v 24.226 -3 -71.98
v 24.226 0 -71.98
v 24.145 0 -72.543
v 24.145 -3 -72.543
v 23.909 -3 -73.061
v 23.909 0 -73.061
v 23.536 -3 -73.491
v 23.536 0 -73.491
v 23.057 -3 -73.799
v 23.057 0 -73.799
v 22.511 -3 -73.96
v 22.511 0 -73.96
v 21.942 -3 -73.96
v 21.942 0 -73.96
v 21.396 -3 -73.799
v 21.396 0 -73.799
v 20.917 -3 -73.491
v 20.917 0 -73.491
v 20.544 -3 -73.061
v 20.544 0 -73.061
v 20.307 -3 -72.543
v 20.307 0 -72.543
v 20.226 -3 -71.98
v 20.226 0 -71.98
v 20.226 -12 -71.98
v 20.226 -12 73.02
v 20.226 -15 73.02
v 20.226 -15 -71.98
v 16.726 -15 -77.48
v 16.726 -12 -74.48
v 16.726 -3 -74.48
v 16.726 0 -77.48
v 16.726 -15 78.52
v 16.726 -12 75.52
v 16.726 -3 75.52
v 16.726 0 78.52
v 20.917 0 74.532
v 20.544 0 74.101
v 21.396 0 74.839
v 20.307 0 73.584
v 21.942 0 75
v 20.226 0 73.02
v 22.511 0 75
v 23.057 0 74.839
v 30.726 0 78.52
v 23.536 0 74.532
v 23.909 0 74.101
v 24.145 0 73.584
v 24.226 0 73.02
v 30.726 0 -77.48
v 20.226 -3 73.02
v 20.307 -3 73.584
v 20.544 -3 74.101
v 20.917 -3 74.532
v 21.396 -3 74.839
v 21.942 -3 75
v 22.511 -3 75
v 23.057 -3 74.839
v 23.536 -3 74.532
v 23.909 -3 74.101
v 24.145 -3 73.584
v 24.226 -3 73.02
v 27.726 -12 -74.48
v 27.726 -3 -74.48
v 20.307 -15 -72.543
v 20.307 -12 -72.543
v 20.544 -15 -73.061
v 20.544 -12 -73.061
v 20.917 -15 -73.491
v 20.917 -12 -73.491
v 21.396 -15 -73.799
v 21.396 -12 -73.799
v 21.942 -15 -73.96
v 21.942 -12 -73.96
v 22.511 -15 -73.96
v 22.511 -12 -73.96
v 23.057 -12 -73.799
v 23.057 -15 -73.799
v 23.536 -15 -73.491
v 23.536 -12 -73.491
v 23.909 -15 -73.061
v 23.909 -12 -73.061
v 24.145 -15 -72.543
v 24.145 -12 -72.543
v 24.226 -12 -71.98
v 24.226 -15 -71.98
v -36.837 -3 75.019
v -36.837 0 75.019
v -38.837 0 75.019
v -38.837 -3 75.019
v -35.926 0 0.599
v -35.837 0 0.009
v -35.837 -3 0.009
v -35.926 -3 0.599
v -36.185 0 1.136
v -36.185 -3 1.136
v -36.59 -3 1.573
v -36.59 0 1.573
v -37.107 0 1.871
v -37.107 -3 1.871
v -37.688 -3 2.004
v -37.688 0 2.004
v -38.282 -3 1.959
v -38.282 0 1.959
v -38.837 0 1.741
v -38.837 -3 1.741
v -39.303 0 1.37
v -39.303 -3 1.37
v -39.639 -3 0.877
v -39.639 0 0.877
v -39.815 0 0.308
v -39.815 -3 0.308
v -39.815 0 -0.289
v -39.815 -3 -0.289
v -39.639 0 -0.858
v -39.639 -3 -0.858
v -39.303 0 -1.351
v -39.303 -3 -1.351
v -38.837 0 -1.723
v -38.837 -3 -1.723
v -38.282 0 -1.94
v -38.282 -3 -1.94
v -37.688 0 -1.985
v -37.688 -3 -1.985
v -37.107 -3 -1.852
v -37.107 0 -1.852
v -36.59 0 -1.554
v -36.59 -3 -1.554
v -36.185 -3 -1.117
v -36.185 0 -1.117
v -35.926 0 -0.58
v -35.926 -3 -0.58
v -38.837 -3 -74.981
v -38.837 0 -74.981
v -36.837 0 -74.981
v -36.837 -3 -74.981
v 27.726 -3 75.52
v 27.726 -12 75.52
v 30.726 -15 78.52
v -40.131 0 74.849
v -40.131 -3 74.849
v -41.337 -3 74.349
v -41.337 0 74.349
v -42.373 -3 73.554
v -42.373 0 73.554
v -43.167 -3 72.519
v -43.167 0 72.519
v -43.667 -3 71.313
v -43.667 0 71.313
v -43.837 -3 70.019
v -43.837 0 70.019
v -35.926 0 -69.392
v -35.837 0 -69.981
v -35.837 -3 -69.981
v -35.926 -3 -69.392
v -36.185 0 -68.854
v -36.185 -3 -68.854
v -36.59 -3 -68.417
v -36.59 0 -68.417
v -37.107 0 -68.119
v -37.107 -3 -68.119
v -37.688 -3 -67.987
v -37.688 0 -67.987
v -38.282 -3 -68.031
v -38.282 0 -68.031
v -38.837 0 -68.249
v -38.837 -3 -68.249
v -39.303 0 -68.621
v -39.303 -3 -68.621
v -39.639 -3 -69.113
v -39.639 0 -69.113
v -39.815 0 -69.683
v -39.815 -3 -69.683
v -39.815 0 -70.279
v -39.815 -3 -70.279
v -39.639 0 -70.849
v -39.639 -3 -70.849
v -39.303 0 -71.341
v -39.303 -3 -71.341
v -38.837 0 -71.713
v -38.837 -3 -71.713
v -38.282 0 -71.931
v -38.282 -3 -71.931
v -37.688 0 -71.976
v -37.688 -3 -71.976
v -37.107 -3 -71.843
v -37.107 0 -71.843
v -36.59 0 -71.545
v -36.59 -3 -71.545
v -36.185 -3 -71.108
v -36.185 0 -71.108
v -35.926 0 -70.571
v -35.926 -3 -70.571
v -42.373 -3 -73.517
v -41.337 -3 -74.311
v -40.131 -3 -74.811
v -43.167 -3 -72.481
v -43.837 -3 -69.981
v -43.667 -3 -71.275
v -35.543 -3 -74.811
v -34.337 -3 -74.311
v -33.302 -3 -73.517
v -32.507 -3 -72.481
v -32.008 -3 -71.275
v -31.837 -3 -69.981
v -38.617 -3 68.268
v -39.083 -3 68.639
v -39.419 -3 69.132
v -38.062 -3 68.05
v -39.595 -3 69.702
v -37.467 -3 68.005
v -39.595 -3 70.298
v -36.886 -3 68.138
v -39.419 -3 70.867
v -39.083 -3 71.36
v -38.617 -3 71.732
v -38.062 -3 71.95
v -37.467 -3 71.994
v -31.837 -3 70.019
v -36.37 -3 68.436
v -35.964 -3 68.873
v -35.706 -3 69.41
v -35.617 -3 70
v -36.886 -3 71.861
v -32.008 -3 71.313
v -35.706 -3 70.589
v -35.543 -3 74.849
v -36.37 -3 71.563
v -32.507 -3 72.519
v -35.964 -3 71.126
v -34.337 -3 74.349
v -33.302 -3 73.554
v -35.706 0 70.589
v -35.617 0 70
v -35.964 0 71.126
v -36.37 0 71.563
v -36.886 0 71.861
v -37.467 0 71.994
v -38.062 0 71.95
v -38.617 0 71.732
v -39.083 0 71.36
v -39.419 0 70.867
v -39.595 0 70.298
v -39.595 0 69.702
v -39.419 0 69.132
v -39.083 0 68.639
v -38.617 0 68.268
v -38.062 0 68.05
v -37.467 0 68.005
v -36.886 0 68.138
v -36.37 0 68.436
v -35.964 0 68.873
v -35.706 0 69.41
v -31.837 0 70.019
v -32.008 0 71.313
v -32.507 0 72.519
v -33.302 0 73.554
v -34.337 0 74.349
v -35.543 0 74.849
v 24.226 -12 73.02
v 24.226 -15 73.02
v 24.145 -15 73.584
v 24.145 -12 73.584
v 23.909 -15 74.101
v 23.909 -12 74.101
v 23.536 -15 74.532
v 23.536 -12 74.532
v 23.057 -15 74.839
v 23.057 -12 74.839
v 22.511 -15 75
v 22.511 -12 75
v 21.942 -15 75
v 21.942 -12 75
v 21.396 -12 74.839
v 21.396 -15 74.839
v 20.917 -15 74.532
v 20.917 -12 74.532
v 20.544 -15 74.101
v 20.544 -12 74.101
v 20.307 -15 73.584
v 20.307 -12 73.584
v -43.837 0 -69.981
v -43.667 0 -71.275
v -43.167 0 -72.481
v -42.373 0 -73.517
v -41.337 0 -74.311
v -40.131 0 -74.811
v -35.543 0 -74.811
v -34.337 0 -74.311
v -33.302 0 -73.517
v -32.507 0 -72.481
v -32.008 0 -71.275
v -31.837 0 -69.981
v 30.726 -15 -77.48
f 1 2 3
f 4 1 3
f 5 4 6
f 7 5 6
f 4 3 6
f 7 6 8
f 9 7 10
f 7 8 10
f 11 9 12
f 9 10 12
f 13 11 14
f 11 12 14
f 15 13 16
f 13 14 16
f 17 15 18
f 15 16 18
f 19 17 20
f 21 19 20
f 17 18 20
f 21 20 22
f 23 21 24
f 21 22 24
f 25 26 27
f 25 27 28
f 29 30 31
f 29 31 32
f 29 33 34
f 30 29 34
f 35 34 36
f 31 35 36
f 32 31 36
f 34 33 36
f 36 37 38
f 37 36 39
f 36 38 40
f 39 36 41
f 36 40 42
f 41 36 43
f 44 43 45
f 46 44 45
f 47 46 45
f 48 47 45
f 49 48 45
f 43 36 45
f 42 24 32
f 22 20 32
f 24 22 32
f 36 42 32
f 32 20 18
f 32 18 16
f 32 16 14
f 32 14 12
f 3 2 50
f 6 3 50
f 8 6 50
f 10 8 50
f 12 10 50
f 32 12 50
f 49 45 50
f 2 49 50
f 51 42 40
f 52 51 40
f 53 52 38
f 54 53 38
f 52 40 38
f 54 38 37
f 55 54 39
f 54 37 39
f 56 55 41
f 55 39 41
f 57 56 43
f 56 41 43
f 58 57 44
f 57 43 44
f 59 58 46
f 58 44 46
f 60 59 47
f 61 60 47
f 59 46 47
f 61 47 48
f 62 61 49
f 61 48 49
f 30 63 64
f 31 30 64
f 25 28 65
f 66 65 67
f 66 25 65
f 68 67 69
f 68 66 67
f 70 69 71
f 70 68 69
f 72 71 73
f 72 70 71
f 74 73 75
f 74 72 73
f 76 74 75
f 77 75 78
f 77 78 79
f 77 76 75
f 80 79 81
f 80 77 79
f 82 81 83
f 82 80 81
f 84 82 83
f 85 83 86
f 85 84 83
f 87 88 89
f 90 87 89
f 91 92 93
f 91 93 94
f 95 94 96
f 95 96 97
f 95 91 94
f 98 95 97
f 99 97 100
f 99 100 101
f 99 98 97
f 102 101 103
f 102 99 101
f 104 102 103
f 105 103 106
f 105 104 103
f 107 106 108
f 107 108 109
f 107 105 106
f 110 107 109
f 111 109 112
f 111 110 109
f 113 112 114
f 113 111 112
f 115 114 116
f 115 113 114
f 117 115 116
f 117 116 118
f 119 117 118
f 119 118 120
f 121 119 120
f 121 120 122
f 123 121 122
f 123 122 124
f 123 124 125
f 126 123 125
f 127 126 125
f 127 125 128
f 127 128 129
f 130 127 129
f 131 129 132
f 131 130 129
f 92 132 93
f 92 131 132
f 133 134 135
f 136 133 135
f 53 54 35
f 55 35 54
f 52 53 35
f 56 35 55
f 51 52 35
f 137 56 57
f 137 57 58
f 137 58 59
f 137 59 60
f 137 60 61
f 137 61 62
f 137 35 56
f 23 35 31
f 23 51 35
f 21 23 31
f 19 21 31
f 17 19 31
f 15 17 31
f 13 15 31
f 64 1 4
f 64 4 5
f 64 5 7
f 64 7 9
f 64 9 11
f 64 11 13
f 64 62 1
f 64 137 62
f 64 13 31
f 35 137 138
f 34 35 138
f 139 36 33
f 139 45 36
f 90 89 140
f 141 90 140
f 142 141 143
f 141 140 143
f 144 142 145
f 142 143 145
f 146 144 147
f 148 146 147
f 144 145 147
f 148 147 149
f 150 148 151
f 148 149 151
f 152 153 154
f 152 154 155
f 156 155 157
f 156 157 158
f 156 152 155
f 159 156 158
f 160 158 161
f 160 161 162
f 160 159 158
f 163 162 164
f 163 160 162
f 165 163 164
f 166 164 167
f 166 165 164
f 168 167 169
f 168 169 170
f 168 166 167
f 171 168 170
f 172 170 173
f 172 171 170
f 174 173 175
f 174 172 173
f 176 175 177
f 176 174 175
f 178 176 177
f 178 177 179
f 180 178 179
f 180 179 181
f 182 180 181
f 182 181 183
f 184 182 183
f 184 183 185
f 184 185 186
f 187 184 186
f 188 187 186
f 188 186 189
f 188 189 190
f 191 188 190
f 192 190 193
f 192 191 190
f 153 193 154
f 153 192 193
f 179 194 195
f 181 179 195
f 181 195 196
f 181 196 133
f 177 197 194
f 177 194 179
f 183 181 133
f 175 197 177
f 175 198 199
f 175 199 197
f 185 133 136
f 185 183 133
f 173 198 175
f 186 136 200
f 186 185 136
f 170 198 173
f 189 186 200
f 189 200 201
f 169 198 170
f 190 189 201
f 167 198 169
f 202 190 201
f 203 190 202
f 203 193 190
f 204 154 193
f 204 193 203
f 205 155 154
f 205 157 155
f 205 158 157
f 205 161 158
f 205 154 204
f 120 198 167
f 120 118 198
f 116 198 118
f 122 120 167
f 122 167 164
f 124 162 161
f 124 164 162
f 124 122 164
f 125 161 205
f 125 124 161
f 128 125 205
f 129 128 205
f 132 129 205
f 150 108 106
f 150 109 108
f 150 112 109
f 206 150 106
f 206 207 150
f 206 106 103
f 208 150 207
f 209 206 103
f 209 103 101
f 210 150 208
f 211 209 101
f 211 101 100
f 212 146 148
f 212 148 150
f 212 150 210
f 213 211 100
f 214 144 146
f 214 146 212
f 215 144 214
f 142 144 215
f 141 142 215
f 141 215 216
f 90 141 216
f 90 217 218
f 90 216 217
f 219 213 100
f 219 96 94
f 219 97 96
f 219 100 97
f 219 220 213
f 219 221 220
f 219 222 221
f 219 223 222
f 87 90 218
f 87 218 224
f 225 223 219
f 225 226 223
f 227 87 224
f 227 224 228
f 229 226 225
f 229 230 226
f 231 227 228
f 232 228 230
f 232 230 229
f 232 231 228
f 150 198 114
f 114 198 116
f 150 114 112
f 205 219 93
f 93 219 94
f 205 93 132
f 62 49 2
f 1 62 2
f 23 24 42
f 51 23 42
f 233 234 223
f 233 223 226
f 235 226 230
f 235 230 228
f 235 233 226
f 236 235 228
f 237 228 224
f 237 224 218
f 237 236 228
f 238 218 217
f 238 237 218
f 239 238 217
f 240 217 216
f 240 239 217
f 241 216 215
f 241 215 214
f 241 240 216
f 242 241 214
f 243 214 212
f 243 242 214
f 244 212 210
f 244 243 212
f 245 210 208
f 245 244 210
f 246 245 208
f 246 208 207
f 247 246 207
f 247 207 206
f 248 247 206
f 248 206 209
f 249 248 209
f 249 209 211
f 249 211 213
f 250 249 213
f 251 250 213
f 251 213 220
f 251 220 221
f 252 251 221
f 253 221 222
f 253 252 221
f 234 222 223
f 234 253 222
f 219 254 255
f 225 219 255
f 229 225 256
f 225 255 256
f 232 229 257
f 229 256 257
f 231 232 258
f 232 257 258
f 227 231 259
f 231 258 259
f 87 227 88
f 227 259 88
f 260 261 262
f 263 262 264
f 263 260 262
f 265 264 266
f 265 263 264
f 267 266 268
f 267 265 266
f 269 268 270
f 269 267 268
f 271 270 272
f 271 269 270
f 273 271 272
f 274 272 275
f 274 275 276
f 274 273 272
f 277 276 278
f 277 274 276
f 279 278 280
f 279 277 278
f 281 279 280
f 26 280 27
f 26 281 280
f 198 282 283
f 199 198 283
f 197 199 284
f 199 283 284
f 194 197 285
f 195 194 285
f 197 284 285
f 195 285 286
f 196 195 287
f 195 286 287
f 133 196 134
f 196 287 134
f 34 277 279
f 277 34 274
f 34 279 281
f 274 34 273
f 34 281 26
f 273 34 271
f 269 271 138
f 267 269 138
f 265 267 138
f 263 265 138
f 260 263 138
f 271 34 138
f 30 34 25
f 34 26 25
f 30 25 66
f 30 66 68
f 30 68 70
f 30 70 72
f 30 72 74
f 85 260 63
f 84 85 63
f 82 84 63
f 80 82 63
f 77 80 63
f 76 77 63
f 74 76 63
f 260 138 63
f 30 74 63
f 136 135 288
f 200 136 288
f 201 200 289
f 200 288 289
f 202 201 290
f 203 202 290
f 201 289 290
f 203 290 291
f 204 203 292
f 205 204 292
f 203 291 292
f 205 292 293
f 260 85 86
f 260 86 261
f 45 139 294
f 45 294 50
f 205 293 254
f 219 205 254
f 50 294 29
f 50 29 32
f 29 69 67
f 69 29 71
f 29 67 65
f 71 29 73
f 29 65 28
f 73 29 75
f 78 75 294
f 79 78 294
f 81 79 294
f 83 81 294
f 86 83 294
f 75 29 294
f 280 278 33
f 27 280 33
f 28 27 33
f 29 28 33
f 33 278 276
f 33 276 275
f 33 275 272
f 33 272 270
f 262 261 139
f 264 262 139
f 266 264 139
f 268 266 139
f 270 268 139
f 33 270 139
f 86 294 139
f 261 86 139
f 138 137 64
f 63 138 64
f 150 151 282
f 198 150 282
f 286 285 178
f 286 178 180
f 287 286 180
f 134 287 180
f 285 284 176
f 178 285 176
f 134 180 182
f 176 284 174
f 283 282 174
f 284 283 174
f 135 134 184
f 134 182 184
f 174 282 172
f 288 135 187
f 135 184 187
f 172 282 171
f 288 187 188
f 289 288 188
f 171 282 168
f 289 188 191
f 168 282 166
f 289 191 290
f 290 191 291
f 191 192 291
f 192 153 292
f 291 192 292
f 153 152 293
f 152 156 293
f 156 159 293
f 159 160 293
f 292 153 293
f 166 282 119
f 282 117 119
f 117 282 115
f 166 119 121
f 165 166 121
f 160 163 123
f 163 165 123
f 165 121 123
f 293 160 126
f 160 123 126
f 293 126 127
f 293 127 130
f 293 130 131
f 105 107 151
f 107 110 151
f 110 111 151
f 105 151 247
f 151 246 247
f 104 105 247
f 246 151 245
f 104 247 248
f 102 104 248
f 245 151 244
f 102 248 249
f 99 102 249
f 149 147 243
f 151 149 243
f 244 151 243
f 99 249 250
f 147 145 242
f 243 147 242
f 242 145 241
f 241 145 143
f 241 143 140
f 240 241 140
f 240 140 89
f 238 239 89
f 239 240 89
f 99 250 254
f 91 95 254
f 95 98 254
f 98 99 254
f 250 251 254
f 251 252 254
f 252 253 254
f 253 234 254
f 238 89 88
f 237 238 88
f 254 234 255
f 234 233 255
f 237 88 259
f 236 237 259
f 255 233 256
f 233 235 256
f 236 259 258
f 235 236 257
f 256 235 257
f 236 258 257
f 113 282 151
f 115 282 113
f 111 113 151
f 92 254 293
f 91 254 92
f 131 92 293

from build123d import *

# Parameters (mm, degrees)
F0_R      = 2
F1_DEPTH  = 3
F2_DEPTH  = 3
F3_DEPTH  = 15
F4_W      = 9
F4_H      = 3
F5_DEPTH  = 150
F6_W      = 9
F6_H      = 9
F7_DEPTH  = 3
F8_START  = -153
F7_FACE_W = 12
F7_FACE_H = 15
F8_DEPTH  = 3
F9_DEPTH  = 15
F10_DEPTH = 2


with BuildPart() as f1:
    # F0 (on Front) → F1 (new body)
    with BuildSketch(Plane.XZ):
        with BuildLine():
            Line((-36.8372175097, 75.0188916922), (-38.8372175097, 75.0188916922))
            ThreePointArc((-38.8372175097, 75.0188916922), (-42.3727514157, 73.5544255981), (-43.8372175097, 70.0188916922))
            Line((-43.8372175097, 70.0188916922), (-43.8372175097, -69.9811083078))
            ThreePointArc((-43.8372175097, -69.9811083078), (-42.3727514157, -73.5166422138), (-38.8372175097, -74.9811083078))
            Line((-38.8372175097, -74.9811083078), (-36.8372175097, -74.9811083078))
            ThreePointArc((-36.8372175097, -74.9811083078), (-33.3016836038, -73.5166422138), (-31.8372175097, -69.9811083078))
            Line((-31.8372175097, -69.9811083078), (-31.8372175097, 70.0188916922))
            ThreePointArc((-31.8372175097, 70.0188916922), (-33.3016836038, 73.5544255981), (-36.8372175097, 75.0188916922))
        make_face()
        with Locations((-37.8372175097, -69.9811083078)):
            Circle(F0_R, mode=Mode.SUBTRACT)
        with Locations((-37.8372175097, 0.0094458461)):
            Circle(F0_R, mode=Mode.SUBTRACT)
        with Locations((-37.616844722, 69.9996530654)):
            Circle(F0_R, mode=Mode.SUBTRACT)
    extrude(amount=F1_DEPTH)


with BuildPart() as f2:
    # F0 (on Front) → F2 (new body)
    with BuildSketch(Plane.XZ):
        Polygon((30.7263619155, 75.5200837851), (27.7263619155, 75.5200837851), (27.7263619155, -74.4799162149), (30.7263619155, -74.4799162149), (30.7263619155, -69.9799162149), (30.7263619155, 70.0200837851), align=None)
        Polygon((27.7263619155, 75.5200837851), (24.2263619155, 75.5200837851), (24.2263619155, 73.0200837851), (24.2263619155, -71.9799162149), (24.2263619155, -74.4799162149), (27.7263619155, -74.4799162149), align=None)
        with BuildLine():
            Line((24.2263619155, 75.5200837851), (20.2263619155, 75.5200837851))
            Line((20.2263619155, 75.5200837851), (20.2263619155, 73.0200837851))
            ThreePointArc((20.2263619155, 73.0200837851), (22.2263619155, 75.0200837851), (24.2263619155, 73.0200837851))
            Line((24.2263619155, 73.0200837851), (24.2263619155, 75.5200837851))
        make_face()
        with BuildLine():
            Line((20.2263619155, -71.9799162149), (20.2263619155, -74.4799162149))
            Line((20.2263619155, -74.4799162149), (24.2263619155, -74.4799162149))
            Line((24.2263619155, -74.4799162149), (24.2263619155, -71.9799162149))
            ThreePointArc((24.2263619155, -71.9799162149), (22.2263619155, -73.9799162149), (20.2263619155, -71.9799162149))
        make_face()
        Polygon((18.7263619155, 75.5200837851), (18.7263619155, 70.5200837851), (18.7263619155, -69.4799162149), (18.7263619155, -74.4799162149), (20.2263619155, -74.4799162149), (20.2263619155, -71.9799162149), (20.2263619155, 73.0200837851), (20.2263619155, 75.5200837851), align=None)
    extrude(amount=F2_DEPTH)

    # F0 (on Front) → F3 (join)
    with BuildSketch(Plane.XZ):
        Polygon((30.7263619155, 75.5200837851), (27.7263619155, 75.5200837851), (27.7263619155, -74.4799162149), (30.7263619155, -74.4799162149), (30.7263619155, -69.9799162149), (30.7263619155, 70.0200837851), align=None)
    extrude(amount=F3_DEPTH)

    # F4 (on face) → F5 (join, through all)
    with BuildSketch(Plane.XY.offset(75.5200837851)):
        with Locations((23.2263619155, -13.5)):
            Rectangle(F4_W, F4_H)
    extrude(amount=-F5_DEPTH)

    # F6 (on face) → F7 (join)
    with BuildSketch(Plane.XY.offset(75.5200837851)):
        Polygon((18.7263619155, 0), (18.7263619155, -3), (27.7263619155, -3), (27.7263619155, -12), (18.7263619155, -12), (18.7263619155, -15), (30.7263619155, -15), (30.7263619155, 0), align=None)
        with Locations((23.2263619155, -7.5)):
            Rectangle(F6_W, F6_H)
    extrude(amount=F7_DEPTH)

    # F7_face (on face) → F8 (join)
    with BuildSketch(Plane(origin=(24.7263619155, -7.5, 78.5200837851), x_dir=(1, 0, 0), z_dir=(0, 0, 1)).offset(F8_START)):
        Rectangle(F7_FACE_W, F7_FACE_H)
    extrude(amount=-F8_DEPTH)

    # F0 (on Front) → F9 (cut, through all)
    with BuildSketch(Plane.XZ):
        with BuildLine():
            ThreePointArc((24.2263619155, 73.0200837851), (22.2263619155, 75.0200837851), (20.2263619155, 73.0200837851))
            Line((20.2263619155, 73.0200837851), (20.2263619155, -71.9799162149))
            ThreePointArc((20.2263619155, -71.9799162149), (22.2263619155, -73.9799162149), (24.2263619155, -71.9799162149))
            Line((24.2263619155, -71.9799162149), (24.2263619155, 73.0200837851))
        make_face()
    extrude(amount=F9_DEPTH, mode=Mode.SUBTRACT)

    # F10 (add): a face of the model
    f10_faces = [f2.faces().sort_by_distance(p)[0] for p in [
        (18.7263619155, -1.5671949464, 0.5200837851),
    ]]
    extrude(f10_faces, amount=F10_DEPTH)


solid = Compound([f1.part, f2.part])
